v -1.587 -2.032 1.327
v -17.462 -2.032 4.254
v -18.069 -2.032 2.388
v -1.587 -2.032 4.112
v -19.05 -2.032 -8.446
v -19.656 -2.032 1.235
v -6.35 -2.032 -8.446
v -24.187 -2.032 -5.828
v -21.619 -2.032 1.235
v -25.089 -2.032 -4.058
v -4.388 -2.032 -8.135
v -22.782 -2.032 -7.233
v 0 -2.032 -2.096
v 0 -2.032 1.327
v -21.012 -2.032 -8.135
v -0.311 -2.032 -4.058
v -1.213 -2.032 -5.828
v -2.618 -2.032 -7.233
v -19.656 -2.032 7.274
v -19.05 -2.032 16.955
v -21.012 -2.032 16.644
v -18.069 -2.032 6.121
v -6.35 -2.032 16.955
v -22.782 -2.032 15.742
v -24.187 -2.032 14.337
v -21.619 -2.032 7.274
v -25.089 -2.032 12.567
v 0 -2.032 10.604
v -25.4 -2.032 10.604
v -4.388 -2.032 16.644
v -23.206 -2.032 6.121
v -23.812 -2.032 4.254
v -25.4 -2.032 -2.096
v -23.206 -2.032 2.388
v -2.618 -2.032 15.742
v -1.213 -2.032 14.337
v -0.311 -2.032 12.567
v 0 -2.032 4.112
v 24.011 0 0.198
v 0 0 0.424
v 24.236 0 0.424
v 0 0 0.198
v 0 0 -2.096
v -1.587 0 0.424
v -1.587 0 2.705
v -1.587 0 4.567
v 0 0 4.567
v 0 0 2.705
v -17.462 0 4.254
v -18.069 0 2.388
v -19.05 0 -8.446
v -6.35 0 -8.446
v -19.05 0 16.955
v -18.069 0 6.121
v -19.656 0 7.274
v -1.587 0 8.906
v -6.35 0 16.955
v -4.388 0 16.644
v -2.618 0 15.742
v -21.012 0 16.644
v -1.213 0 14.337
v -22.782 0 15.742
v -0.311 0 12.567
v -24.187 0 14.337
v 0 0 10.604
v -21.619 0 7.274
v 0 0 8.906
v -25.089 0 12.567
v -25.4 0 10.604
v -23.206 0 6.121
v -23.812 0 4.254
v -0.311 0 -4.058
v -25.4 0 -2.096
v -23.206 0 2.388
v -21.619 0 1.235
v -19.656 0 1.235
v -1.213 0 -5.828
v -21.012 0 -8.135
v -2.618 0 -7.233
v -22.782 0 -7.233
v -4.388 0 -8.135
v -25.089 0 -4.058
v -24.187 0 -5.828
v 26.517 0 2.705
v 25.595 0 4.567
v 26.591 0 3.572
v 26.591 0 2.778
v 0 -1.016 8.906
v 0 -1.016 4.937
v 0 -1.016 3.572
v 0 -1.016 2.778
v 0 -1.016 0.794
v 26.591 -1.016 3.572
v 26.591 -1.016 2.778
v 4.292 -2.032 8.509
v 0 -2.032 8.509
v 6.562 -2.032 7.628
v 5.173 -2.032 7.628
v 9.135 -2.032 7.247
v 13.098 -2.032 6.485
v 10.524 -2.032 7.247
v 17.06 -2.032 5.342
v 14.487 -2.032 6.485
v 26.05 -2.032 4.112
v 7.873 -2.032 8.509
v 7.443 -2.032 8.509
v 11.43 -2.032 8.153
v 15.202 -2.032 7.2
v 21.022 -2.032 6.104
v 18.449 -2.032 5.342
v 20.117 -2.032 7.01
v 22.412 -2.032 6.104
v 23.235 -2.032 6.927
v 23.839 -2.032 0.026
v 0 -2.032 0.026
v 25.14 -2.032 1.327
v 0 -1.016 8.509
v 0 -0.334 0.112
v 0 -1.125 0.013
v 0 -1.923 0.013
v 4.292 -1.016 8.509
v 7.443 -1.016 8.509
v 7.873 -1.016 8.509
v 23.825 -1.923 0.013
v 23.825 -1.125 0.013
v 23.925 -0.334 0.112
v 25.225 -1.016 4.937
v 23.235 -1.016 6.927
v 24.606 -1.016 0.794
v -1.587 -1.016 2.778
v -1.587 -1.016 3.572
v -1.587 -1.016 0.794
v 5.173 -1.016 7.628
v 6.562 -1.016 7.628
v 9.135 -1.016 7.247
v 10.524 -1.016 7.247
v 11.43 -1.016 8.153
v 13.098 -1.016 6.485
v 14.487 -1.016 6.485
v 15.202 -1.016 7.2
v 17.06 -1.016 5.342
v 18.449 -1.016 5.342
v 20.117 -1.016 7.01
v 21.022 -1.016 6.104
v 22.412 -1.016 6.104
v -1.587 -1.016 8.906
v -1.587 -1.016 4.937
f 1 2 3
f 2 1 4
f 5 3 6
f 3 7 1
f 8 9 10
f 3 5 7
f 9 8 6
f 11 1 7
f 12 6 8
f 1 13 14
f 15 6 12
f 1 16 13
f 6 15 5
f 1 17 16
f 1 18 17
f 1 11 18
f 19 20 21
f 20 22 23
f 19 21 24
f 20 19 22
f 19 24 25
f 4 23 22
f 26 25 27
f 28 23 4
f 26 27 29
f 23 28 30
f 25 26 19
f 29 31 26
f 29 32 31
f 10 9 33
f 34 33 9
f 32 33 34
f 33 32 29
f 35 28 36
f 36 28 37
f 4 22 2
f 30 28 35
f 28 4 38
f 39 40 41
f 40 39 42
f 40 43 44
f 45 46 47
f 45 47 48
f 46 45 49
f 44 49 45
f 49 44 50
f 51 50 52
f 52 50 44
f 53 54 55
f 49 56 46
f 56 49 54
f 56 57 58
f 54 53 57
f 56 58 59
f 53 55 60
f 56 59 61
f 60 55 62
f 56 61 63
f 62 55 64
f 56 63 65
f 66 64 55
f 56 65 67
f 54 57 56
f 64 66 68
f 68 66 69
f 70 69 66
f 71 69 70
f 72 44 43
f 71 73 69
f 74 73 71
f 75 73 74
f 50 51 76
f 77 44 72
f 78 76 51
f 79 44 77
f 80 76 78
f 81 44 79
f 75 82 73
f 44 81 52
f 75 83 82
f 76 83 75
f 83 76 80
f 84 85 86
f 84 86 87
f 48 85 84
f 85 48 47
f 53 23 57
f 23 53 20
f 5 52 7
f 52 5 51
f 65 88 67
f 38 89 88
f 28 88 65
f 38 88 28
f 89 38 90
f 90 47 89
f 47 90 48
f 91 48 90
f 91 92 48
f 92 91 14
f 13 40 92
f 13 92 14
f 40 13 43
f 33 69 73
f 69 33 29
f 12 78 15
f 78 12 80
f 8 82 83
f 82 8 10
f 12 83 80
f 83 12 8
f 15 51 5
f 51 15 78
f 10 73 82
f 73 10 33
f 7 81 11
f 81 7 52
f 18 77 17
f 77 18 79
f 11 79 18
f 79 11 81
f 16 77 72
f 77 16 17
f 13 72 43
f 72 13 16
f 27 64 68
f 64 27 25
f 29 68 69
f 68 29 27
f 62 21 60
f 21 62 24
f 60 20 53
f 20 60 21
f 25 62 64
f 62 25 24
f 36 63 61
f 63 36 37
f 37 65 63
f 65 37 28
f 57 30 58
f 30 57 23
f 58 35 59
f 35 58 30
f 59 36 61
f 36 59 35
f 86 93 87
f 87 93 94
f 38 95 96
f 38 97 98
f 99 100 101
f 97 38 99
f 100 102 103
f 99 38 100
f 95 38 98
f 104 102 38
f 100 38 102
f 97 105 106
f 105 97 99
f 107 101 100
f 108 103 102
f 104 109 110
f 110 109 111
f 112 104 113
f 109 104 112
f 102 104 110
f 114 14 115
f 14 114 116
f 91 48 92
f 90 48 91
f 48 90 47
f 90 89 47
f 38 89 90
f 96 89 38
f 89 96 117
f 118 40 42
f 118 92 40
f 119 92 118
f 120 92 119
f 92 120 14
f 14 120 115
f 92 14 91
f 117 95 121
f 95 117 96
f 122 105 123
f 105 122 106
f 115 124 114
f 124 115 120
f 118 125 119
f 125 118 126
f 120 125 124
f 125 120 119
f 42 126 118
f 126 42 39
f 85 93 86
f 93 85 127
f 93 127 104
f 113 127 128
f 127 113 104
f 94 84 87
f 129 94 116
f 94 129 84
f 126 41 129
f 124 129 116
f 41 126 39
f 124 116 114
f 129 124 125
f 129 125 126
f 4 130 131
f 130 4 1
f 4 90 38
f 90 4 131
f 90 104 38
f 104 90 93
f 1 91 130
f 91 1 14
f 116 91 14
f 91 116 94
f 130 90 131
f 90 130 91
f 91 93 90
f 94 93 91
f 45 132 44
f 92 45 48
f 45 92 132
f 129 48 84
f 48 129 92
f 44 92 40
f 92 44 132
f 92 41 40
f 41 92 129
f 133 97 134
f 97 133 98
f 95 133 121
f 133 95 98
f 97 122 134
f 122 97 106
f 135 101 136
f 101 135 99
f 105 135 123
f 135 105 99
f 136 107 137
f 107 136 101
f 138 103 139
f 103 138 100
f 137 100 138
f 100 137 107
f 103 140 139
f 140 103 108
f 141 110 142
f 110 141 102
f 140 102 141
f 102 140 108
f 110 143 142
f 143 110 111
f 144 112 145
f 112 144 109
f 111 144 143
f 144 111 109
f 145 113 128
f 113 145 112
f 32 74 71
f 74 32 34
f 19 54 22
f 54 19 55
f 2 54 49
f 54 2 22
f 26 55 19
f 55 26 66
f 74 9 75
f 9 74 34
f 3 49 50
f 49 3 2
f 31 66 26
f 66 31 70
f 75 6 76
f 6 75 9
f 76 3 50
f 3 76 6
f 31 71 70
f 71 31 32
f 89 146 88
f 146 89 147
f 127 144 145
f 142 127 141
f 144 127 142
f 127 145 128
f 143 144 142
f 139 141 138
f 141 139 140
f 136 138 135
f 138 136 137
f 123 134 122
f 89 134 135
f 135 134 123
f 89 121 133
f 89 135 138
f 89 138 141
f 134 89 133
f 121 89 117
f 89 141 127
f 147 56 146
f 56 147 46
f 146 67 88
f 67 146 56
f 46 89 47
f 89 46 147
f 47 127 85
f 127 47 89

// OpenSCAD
// Physical Keygen - by Nirav Patel <http://eclecti.cc>
//
// Generate a duplicate of a Schlage SC1 key by editing the last line of the file
// and entering in the key code of the lock.  If you don't know the key code,
// you can measure the key and compare the numbers at:
// http://web.archive.org/web/20050217020917fw_/http://dlaco.com/spacing/tips.htm
//
// This work is licensed under a Creative Commons Attribution 3.0 Unported License.

// Since the keys and locks I have were all designed in imperial units, the
// constants in this file will be defined in inches.  The mm function
// allows us to retain the proper size for exporting a metric STL.

// Thanks to Roidzo - Easy Key Copier for help with the Customizer comments http://www.thingiverse.com/thing:52363

// preview[view:south, tilt:side]

//(this is just a reference table to help pick cuts below)
distance_from_cut_to_bottom_of_key = 0; // [0:0 = .335",1:1 = .320",2:2 = .305",3:3 = .290",4:4 = .275",5:5 = .260",6:6 = .245",7:7 = .230",8:8 = .215",9:9 = .200"]

//(cut closest to tip of key)
cut_1 = 5; //[0:9]

//
cut_2 = 7; //[0:9]

//
cut_3 = 4; //[0:9]

//
cut_4 = 2; //[0:9]

//(cut closest to grip/bow of key)
cut_5 = 1; //[0:9]

//(Rotate key flat for printing)
rotate_flat=0; //[0:No,1:Yes]

function mm(i) = i*25.4;

module rounded(size, r) {
    union() {
        translate([r, 0, 0]) cube([size[0]-2*r, size[1], size[2]]);
        translate([0, r, 0]) cube([size[0], size[1]-2*r, size[2]]);
        translate([r, r, 0]) cylinder(h=size[2], r=r);
        translate([size[0]-r, r, 0]) cylinder(h=size[2], r=r);
        translate([r, size[1]-r, 0]) cylinder(h=size[2], r=r);
        translate([size[0]-r, size[1]-r, 0]) cylinder(h=size[2], r=r);
    }
}

module bit() {
    w = mm(1/4);
    difference() {
        translate([-w/2, 0, 0]) cube([w, mm(1), w]);
        translate([-mm(7/256), 0, 0]) rotate([0, 0, 135]) cube([w, w, w]);
         translate([mm(7/256), 0, 0]) rotate([0, 0, -45]) cube([w, w, w]);
    }
}

// Schlage SC1 5 pin key.  The measurements are mostly guesses based on reverse
// engineering some keys I have and some publicly available information.
module sc1(bits) {
    // You may need to adjust these to fit your specific printer settings
    thickness = mm(0.080);
    length = mm(17/16);
    width = mm(.335);
    
    shoulder = mm(.231);
    pin_spacing = mm(.156);
    depth_inc = mm(.015);
    
    // A fudge factor.  Printing with your average RepRap, the bottom layer is
    // going to be squeezed larger than you want. You can make the pins
    // go slighly deeper by a fudge amount to make up for it if you aren't
    // adjusting for it elsewhere like Skeinforge or in your firmware.
    // 0.5mm works well for me.
    fudge = 0.5;
    
    // Handle size
    h_l = mm(1);
    h_w = mm(1);
    h_d = mm(1/16);
    difference() {
        // blade and key handle
        union() {
            translate([-h_l, -h_w/2 + width/2, 0]) rounded([h_l, h_w, thickness], mm(1/4));
            intersection() {
                // cut a little off the tip to avoid going too long
                cube([length - mm(1/64), width, thickness]);
                translate([0, mm(1/4), thickness*3/4]) rotate([0, 90, 0]) cylinder(h=length, r=mm(1/4), $fn=50);
            }
        }
        
        // chamfer the tip
        translate([length, mm(1/8), 0]) {
            rotate([0, 0, 45]) cube([10, 10, thickness]);
            rotate([0, 0, 225]) cube([10, 10, thickness]);
        }
        
        // put in a hole for keychain use
        translate([-h_l + mm(3/16), width/2, 0]) cylinder(h=thickness, r=mm(1/8));
        
        // cut the channels in the key.  designed more for printability than accuracy
        union() {
            translate([-h_d, mm(9/64), thickness/2]) rotate([62, 0, 0]) cube([length + h_d, width, width]);
            translate([-h_d, mm(7/64), thickness/2]) rotate([55, 0, 0]) cube([length + h_d, width, width]);
            translate([-h_d, mm(7/64), thickness/2]) cube([length + h_d, mm(1/32), width]);
        }
        
        translate([-h_d, width - mm(9/64), 0]) cube([length + h_d, width - (width - mm(10/64)), thickness/2]);
        translate([-h_d, width - mm(9/64), thickness/2]) rotate([-110, 0, 0]) cube([length + h_d, width, thickness/2]);
        
        intersection() {
            translate([-h_d, mm(1/32), thickness/2]) rotate([-118, 0, 0]) cube([length + h_d, width, width]);
            translate([-h_d, mm(1/32), thickness/2]) rotate([-110, 0, 0]) cube([length + h_d, width, width]);
        }
        
        // Do the actual bitting
        for (b = [0:4]) {
            translate([shoulder + b*pin_spacing, width - bits[b]*depth_inc - fudge, 0]) bit();
        }
    }
}

// This sample key goes to a lock that is sitting disassembled on my desk
// Flip the key over for easy printing
if (rotate_flat==1){
	rotate([180,0,0]) sc1([cut_5,cut_4,cut_3,cut_2,cut_1]);
} else {
	rotate([90,0,0]) sc1([cut_5,cut_4,cut_3,cut_2,cut_1]);
}
